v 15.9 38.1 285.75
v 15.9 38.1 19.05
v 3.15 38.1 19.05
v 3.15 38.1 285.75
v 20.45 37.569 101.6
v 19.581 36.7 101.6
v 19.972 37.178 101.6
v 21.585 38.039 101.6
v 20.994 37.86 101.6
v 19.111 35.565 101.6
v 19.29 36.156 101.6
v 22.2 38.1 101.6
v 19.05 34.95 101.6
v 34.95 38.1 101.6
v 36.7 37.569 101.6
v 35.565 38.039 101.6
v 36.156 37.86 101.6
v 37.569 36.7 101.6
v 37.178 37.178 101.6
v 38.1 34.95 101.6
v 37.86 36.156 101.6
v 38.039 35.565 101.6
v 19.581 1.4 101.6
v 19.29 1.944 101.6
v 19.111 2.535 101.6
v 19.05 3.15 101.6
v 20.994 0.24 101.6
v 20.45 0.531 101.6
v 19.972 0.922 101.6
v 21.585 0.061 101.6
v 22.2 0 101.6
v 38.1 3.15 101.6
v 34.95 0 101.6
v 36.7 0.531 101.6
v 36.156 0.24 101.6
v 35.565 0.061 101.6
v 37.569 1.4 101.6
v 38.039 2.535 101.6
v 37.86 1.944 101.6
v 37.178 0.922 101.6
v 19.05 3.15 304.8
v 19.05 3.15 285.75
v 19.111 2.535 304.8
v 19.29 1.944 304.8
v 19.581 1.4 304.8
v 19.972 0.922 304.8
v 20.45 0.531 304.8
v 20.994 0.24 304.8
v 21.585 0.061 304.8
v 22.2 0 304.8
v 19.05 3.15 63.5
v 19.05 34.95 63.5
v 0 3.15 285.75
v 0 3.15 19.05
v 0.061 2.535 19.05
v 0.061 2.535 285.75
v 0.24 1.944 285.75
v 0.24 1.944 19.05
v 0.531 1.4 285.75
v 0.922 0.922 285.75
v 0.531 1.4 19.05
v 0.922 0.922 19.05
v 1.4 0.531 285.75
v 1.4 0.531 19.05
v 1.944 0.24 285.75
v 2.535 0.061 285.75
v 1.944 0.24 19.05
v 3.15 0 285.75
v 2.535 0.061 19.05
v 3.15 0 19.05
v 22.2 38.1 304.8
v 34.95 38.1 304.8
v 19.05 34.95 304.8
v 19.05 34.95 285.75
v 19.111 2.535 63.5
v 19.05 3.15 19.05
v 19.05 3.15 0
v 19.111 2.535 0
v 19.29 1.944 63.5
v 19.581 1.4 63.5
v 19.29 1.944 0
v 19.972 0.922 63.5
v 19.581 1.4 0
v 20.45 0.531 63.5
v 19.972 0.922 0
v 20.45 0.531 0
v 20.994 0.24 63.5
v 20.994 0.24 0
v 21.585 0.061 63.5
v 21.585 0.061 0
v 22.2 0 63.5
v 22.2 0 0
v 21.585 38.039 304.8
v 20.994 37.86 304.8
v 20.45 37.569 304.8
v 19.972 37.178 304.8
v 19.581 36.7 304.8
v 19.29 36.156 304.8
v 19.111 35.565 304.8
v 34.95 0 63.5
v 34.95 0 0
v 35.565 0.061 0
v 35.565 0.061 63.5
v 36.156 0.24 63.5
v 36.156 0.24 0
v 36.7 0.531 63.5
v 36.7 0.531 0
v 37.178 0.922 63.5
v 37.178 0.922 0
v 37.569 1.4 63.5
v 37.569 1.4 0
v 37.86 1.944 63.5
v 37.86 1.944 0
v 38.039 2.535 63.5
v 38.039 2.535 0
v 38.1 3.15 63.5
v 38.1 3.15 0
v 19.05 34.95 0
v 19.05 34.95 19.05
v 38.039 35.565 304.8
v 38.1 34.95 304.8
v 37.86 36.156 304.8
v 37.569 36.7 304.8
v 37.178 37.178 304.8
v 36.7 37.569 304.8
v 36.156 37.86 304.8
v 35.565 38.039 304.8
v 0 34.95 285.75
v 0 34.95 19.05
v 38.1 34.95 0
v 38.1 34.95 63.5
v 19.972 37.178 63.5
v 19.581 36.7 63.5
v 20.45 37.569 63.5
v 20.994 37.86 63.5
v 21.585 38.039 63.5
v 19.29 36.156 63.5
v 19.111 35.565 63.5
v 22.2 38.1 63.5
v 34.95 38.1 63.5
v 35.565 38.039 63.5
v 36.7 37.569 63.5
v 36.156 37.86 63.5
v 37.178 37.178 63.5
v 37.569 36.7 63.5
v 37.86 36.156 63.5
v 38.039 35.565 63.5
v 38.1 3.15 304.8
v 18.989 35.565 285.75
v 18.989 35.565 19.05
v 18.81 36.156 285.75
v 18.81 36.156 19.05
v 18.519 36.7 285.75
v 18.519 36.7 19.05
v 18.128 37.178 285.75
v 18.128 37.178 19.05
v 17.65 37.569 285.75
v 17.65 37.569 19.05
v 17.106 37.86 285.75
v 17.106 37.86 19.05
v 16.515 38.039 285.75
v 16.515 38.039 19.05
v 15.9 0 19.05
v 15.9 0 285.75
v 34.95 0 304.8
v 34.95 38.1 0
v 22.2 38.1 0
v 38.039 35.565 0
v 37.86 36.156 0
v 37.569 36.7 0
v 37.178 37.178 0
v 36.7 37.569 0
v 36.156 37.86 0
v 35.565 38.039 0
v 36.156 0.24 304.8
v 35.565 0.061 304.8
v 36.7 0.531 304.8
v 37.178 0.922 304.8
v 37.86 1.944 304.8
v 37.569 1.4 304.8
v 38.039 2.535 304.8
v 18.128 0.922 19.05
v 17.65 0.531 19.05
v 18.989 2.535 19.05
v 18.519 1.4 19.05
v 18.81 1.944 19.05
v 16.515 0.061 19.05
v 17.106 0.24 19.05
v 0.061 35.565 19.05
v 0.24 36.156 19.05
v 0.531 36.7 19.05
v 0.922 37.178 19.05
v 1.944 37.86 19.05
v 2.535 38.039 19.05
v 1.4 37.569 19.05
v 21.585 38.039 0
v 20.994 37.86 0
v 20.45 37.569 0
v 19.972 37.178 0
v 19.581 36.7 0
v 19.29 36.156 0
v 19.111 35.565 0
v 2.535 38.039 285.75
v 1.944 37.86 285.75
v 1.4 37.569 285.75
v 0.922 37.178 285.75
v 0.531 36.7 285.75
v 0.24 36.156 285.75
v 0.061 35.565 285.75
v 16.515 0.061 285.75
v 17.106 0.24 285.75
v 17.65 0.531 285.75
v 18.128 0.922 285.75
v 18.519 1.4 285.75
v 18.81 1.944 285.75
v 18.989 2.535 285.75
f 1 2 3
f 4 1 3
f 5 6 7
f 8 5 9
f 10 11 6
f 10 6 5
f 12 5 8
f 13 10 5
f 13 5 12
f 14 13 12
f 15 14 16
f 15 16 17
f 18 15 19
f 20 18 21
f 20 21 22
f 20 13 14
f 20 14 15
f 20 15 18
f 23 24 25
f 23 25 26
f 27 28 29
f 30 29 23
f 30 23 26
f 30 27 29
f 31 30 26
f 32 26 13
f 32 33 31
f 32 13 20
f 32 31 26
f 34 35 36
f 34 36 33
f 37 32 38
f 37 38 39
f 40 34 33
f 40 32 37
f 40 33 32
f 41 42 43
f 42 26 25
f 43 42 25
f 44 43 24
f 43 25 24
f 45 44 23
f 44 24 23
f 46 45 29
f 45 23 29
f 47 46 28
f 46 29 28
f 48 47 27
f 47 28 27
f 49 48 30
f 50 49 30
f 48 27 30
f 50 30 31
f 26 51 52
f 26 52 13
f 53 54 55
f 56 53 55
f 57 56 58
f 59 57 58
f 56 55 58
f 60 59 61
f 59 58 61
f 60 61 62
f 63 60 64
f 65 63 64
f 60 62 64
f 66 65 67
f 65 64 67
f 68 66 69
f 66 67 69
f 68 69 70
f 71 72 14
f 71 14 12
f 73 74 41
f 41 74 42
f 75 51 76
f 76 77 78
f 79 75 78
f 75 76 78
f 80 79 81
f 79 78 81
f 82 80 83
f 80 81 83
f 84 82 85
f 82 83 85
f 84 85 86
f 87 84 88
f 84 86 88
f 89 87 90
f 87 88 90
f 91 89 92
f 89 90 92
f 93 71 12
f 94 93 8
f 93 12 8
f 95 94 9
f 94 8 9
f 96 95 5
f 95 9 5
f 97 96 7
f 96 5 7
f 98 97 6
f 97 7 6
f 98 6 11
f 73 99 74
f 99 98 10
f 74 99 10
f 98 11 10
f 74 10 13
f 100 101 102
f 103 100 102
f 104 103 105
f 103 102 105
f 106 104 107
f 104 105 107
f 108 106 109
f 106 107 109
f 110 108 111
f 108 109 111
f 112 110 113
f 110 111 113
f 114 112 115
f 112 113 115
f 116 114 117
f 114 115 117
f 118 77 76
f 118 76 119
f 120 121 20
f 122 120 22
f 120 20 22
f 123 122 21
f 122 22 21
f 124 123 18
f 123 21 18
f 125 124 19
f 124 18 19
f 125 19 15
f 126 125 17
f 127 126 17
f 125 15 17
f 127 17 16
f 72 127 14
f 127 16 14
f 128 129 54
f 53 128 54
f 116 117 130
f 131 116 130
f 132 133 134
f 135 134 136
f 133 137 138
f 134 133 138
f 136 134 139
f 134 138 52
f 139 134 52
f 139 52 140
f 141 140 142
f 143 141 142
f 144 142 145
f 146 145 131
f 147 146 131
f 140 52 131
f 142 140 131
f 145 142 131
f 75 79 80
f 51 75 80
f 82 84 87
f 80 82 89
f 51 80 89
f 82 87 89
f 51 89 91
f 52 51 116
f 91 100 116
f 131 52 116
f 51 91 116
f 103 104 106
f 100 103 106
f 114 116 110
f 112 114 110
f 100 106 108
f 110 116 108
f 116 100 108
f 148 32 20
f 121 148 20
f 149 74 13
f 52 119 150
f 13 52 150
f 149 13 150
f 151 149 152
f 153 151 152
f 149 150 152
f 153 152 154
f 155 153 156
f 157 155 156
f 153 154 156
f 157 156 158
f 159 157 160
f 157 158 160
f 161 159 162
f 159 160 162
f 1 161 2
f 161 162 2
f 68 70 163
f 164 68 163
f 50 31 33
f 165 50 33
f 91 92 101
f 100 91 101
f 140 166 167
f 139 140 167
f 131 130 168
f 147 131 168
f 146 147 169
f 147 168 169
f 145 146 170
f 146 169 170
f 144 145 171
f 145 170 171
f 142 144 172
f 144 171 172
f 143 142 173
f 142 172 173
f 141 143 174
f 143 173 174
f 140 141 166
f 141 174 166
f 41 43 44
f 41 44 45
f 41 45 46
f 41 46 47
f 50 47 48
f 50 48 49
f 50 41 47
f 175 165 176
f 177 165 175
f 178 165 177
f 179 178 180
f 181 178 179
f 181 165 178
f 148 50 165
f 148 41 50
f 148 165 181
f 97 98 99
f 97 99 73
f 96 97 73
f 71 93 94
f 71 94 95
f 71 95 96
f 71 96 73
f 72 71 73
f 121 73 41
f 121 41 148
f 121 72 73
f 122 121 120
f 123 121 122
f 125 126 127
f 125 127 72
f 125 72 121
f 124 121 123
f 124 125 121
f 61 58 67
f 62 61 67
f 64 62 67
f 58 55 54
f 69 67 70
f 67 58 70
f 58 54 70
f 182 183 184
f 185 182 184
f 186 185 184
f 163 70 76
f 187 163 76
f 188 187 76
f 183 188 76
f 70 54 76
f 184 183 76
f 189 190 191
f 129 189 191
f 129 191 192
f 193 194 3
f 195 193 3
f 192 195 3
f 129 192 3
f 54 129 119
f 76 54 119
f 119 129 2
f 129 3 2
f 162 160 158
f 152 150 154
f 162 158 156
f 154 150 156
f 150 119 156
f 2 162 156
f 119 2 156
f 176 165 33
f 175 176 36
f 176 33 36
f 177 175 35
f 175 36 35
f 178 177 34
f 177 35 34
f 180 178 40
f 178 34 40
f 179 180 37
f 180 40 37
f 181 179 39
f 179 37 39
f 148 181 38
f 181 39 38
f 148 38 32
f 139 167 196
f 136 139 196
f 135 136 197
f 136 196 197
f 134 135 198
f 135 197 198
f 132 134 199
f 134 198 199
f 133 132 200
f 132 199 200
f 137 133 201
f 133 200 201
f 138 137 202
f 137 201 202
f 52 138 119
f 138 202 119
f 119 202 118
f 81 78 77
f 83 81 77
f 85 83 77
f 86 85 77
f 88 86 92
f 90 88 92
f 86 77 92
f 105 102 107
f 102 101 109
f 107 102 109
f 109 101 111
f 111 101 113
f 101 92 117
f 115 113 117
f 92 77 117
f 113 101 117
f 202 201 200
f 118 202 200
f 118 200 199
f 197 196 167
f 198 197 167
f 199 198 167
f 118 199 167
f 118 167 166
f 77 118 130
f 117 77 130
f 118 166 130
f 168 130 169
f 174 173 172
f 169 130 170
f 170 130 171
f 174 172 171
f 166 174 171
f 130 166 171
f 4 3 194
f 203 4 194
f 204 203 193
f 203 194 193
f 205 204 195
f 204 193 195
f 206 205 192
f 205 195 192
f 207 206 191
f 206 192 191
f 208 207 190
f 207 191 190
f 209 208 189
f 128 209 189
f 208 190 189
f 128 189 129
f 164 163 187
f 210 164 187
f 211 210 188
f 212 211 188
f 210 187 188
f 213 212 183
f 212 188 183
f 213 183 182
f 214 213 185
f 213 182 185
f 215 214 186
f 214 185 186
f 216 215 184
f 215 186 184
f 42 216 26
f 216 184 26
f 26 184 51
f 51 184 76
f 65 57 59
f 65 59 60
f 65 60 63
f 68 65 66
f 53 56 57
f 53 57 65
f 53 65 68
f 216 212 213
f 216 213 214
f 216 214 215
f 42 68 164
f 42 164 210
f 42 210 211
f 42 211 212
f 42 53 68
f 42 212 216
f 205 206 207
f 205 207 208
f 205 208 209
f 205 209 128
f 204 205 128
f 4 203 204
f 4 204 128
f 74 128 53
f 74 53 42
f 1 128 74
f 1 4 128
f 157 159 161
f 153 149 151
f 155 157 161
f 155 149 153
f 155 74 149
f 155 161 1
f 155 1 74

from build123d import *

# Parameters (mm, degrees)
F1_DEPTH = 304.8
F2_DEPTH = 285.75
F3_DEPTH = 19.05
F4_W     = 19.05
F4_H     = 38.1
F5_DEPTH = 38.101


# Not quite as in the source:
# - a feature names something its author has since deleted; it is built from what else it names


with BuildPart() as f1:
    # F0 (on Top) → F1 (new body)
    with BuildSketch(Plane.XY):
        with BuildLine():
            Line((19.05, 34.9504), (19.05, 3.1496))
            ThreePointArc((19.05, 3.1496), (19.972496482, 0.922496482), (22.1996, 0))
            Line((22.1996, 0), (34.9504, 0))
            ThreePointArc((34.9504, 0), (37.177503518, 0.922496482), (38.1, 3.1496))
            Line((38.1, 3.1496), (38.1, 34.9504))
            ThreePointArc((38.1, 34.9504), (37.177503518, 37.177503518), (34.9504, 38.1))
            Line((34.9504, 38.1), (22.1996, 38.1))
            ThreePointArc((22.1996, 38.1), (19.972496482, 37.177503518), (19.05, 34.9504))
        make_face()
    extrude(amount=F1_DEPTH)

    # F0 (on Top) → F2 (join)
    with BuildSketch(Plane.XY):
        with BuildLine():
            ThreePointArc((0, 3.1496), (0.922496482, 0.922496482), (3.1496, 0))
            Line((3.1496, 0), (15.9004, 0))
            ThreePointArc((15.9004, 0), (18.127503518, 0.922496482), (19.05, 3.1496))
            Line((19.05, 3.1496), (19.05, 34.9504))
            ThreePointArc((19.05, 34.9504), (18.127503518, 37.177503518), (15.9004, 38.1))
            Line((15.9004, 38.1), (3.1496, 38.1))
            ThreePointArc((3.1496, 38.1), (0.922496482, 37.177503518), (0, 34.9504))
            Line((0, 34.9504), (0, 3.1496))
        make_face()
        with BuildLine():
            Line((19.05, 34.9504), (19.05, 3.1496))
            ThreePointArc((19.05, 3.1496), (19.972496482, 0.922496482), (22.1996, 0))
            Line((22.1996, 0), (34.9504, 0))
            ThreePointArc((34.9504, 0), (37.177503518, 0.922496482), (38.1, 3.1496))
            Line((38.1, 3.1496), (38.1, 34.9504))
            ThreePointArc((38.1, 34.9504), (37.177503518, 37.177503518), (34.9504, 38.1))
            Line((34.9504, 38.1), (22.1996, 38.1))
            ThreePointArc((22.1996, 38.1), (19.972496482, 37.177503518), (19.05, 34.9504))
        make_face()
    extrude(amount=F2_DEPTH)

    # F0 (on Top) → F3 (cut)
    with BuildSketch(Plane.XY):
        with BuildLine():
            ThreePointArc((0, 3.1496), (0.922496482, 0.922496482), (3.1496, 0))
            Line((3.1496, 0), (15.9004, 0))
            ThreePointArc((15.9004, 0), (18.127503518, 0.922496482), (19.05, 3.1496))
            Line((19.05, 3.1496), (19.05, 34.9504))
            ThreePointArc((19.05, 34.9504), (18.127503518, 37.177503518), (15.9004, 38.1))
            Line((15.9004, 38.1), (3.1496, 38.1))
            ThreePointArc((3.1496, 38.1), (0.922496482, 37.177503518), (0, 34.9504))
            Line((0, 34.9504), (0, 3.1496))
        make_face()
    extrude(amount=F3_DEPTH, mode=Mode.SUBTRACT)

    # F4 (on face) → F5 (cut, through all)
    with BuildSketch(Plane.XZ):
        with Locations((28.575, 82.55)):
            Rectangle(F4_W, F4_H)
    extrude(amount=-F5_DEPTH, mode=Mode.SUBTRACT)


solid = f1.part
